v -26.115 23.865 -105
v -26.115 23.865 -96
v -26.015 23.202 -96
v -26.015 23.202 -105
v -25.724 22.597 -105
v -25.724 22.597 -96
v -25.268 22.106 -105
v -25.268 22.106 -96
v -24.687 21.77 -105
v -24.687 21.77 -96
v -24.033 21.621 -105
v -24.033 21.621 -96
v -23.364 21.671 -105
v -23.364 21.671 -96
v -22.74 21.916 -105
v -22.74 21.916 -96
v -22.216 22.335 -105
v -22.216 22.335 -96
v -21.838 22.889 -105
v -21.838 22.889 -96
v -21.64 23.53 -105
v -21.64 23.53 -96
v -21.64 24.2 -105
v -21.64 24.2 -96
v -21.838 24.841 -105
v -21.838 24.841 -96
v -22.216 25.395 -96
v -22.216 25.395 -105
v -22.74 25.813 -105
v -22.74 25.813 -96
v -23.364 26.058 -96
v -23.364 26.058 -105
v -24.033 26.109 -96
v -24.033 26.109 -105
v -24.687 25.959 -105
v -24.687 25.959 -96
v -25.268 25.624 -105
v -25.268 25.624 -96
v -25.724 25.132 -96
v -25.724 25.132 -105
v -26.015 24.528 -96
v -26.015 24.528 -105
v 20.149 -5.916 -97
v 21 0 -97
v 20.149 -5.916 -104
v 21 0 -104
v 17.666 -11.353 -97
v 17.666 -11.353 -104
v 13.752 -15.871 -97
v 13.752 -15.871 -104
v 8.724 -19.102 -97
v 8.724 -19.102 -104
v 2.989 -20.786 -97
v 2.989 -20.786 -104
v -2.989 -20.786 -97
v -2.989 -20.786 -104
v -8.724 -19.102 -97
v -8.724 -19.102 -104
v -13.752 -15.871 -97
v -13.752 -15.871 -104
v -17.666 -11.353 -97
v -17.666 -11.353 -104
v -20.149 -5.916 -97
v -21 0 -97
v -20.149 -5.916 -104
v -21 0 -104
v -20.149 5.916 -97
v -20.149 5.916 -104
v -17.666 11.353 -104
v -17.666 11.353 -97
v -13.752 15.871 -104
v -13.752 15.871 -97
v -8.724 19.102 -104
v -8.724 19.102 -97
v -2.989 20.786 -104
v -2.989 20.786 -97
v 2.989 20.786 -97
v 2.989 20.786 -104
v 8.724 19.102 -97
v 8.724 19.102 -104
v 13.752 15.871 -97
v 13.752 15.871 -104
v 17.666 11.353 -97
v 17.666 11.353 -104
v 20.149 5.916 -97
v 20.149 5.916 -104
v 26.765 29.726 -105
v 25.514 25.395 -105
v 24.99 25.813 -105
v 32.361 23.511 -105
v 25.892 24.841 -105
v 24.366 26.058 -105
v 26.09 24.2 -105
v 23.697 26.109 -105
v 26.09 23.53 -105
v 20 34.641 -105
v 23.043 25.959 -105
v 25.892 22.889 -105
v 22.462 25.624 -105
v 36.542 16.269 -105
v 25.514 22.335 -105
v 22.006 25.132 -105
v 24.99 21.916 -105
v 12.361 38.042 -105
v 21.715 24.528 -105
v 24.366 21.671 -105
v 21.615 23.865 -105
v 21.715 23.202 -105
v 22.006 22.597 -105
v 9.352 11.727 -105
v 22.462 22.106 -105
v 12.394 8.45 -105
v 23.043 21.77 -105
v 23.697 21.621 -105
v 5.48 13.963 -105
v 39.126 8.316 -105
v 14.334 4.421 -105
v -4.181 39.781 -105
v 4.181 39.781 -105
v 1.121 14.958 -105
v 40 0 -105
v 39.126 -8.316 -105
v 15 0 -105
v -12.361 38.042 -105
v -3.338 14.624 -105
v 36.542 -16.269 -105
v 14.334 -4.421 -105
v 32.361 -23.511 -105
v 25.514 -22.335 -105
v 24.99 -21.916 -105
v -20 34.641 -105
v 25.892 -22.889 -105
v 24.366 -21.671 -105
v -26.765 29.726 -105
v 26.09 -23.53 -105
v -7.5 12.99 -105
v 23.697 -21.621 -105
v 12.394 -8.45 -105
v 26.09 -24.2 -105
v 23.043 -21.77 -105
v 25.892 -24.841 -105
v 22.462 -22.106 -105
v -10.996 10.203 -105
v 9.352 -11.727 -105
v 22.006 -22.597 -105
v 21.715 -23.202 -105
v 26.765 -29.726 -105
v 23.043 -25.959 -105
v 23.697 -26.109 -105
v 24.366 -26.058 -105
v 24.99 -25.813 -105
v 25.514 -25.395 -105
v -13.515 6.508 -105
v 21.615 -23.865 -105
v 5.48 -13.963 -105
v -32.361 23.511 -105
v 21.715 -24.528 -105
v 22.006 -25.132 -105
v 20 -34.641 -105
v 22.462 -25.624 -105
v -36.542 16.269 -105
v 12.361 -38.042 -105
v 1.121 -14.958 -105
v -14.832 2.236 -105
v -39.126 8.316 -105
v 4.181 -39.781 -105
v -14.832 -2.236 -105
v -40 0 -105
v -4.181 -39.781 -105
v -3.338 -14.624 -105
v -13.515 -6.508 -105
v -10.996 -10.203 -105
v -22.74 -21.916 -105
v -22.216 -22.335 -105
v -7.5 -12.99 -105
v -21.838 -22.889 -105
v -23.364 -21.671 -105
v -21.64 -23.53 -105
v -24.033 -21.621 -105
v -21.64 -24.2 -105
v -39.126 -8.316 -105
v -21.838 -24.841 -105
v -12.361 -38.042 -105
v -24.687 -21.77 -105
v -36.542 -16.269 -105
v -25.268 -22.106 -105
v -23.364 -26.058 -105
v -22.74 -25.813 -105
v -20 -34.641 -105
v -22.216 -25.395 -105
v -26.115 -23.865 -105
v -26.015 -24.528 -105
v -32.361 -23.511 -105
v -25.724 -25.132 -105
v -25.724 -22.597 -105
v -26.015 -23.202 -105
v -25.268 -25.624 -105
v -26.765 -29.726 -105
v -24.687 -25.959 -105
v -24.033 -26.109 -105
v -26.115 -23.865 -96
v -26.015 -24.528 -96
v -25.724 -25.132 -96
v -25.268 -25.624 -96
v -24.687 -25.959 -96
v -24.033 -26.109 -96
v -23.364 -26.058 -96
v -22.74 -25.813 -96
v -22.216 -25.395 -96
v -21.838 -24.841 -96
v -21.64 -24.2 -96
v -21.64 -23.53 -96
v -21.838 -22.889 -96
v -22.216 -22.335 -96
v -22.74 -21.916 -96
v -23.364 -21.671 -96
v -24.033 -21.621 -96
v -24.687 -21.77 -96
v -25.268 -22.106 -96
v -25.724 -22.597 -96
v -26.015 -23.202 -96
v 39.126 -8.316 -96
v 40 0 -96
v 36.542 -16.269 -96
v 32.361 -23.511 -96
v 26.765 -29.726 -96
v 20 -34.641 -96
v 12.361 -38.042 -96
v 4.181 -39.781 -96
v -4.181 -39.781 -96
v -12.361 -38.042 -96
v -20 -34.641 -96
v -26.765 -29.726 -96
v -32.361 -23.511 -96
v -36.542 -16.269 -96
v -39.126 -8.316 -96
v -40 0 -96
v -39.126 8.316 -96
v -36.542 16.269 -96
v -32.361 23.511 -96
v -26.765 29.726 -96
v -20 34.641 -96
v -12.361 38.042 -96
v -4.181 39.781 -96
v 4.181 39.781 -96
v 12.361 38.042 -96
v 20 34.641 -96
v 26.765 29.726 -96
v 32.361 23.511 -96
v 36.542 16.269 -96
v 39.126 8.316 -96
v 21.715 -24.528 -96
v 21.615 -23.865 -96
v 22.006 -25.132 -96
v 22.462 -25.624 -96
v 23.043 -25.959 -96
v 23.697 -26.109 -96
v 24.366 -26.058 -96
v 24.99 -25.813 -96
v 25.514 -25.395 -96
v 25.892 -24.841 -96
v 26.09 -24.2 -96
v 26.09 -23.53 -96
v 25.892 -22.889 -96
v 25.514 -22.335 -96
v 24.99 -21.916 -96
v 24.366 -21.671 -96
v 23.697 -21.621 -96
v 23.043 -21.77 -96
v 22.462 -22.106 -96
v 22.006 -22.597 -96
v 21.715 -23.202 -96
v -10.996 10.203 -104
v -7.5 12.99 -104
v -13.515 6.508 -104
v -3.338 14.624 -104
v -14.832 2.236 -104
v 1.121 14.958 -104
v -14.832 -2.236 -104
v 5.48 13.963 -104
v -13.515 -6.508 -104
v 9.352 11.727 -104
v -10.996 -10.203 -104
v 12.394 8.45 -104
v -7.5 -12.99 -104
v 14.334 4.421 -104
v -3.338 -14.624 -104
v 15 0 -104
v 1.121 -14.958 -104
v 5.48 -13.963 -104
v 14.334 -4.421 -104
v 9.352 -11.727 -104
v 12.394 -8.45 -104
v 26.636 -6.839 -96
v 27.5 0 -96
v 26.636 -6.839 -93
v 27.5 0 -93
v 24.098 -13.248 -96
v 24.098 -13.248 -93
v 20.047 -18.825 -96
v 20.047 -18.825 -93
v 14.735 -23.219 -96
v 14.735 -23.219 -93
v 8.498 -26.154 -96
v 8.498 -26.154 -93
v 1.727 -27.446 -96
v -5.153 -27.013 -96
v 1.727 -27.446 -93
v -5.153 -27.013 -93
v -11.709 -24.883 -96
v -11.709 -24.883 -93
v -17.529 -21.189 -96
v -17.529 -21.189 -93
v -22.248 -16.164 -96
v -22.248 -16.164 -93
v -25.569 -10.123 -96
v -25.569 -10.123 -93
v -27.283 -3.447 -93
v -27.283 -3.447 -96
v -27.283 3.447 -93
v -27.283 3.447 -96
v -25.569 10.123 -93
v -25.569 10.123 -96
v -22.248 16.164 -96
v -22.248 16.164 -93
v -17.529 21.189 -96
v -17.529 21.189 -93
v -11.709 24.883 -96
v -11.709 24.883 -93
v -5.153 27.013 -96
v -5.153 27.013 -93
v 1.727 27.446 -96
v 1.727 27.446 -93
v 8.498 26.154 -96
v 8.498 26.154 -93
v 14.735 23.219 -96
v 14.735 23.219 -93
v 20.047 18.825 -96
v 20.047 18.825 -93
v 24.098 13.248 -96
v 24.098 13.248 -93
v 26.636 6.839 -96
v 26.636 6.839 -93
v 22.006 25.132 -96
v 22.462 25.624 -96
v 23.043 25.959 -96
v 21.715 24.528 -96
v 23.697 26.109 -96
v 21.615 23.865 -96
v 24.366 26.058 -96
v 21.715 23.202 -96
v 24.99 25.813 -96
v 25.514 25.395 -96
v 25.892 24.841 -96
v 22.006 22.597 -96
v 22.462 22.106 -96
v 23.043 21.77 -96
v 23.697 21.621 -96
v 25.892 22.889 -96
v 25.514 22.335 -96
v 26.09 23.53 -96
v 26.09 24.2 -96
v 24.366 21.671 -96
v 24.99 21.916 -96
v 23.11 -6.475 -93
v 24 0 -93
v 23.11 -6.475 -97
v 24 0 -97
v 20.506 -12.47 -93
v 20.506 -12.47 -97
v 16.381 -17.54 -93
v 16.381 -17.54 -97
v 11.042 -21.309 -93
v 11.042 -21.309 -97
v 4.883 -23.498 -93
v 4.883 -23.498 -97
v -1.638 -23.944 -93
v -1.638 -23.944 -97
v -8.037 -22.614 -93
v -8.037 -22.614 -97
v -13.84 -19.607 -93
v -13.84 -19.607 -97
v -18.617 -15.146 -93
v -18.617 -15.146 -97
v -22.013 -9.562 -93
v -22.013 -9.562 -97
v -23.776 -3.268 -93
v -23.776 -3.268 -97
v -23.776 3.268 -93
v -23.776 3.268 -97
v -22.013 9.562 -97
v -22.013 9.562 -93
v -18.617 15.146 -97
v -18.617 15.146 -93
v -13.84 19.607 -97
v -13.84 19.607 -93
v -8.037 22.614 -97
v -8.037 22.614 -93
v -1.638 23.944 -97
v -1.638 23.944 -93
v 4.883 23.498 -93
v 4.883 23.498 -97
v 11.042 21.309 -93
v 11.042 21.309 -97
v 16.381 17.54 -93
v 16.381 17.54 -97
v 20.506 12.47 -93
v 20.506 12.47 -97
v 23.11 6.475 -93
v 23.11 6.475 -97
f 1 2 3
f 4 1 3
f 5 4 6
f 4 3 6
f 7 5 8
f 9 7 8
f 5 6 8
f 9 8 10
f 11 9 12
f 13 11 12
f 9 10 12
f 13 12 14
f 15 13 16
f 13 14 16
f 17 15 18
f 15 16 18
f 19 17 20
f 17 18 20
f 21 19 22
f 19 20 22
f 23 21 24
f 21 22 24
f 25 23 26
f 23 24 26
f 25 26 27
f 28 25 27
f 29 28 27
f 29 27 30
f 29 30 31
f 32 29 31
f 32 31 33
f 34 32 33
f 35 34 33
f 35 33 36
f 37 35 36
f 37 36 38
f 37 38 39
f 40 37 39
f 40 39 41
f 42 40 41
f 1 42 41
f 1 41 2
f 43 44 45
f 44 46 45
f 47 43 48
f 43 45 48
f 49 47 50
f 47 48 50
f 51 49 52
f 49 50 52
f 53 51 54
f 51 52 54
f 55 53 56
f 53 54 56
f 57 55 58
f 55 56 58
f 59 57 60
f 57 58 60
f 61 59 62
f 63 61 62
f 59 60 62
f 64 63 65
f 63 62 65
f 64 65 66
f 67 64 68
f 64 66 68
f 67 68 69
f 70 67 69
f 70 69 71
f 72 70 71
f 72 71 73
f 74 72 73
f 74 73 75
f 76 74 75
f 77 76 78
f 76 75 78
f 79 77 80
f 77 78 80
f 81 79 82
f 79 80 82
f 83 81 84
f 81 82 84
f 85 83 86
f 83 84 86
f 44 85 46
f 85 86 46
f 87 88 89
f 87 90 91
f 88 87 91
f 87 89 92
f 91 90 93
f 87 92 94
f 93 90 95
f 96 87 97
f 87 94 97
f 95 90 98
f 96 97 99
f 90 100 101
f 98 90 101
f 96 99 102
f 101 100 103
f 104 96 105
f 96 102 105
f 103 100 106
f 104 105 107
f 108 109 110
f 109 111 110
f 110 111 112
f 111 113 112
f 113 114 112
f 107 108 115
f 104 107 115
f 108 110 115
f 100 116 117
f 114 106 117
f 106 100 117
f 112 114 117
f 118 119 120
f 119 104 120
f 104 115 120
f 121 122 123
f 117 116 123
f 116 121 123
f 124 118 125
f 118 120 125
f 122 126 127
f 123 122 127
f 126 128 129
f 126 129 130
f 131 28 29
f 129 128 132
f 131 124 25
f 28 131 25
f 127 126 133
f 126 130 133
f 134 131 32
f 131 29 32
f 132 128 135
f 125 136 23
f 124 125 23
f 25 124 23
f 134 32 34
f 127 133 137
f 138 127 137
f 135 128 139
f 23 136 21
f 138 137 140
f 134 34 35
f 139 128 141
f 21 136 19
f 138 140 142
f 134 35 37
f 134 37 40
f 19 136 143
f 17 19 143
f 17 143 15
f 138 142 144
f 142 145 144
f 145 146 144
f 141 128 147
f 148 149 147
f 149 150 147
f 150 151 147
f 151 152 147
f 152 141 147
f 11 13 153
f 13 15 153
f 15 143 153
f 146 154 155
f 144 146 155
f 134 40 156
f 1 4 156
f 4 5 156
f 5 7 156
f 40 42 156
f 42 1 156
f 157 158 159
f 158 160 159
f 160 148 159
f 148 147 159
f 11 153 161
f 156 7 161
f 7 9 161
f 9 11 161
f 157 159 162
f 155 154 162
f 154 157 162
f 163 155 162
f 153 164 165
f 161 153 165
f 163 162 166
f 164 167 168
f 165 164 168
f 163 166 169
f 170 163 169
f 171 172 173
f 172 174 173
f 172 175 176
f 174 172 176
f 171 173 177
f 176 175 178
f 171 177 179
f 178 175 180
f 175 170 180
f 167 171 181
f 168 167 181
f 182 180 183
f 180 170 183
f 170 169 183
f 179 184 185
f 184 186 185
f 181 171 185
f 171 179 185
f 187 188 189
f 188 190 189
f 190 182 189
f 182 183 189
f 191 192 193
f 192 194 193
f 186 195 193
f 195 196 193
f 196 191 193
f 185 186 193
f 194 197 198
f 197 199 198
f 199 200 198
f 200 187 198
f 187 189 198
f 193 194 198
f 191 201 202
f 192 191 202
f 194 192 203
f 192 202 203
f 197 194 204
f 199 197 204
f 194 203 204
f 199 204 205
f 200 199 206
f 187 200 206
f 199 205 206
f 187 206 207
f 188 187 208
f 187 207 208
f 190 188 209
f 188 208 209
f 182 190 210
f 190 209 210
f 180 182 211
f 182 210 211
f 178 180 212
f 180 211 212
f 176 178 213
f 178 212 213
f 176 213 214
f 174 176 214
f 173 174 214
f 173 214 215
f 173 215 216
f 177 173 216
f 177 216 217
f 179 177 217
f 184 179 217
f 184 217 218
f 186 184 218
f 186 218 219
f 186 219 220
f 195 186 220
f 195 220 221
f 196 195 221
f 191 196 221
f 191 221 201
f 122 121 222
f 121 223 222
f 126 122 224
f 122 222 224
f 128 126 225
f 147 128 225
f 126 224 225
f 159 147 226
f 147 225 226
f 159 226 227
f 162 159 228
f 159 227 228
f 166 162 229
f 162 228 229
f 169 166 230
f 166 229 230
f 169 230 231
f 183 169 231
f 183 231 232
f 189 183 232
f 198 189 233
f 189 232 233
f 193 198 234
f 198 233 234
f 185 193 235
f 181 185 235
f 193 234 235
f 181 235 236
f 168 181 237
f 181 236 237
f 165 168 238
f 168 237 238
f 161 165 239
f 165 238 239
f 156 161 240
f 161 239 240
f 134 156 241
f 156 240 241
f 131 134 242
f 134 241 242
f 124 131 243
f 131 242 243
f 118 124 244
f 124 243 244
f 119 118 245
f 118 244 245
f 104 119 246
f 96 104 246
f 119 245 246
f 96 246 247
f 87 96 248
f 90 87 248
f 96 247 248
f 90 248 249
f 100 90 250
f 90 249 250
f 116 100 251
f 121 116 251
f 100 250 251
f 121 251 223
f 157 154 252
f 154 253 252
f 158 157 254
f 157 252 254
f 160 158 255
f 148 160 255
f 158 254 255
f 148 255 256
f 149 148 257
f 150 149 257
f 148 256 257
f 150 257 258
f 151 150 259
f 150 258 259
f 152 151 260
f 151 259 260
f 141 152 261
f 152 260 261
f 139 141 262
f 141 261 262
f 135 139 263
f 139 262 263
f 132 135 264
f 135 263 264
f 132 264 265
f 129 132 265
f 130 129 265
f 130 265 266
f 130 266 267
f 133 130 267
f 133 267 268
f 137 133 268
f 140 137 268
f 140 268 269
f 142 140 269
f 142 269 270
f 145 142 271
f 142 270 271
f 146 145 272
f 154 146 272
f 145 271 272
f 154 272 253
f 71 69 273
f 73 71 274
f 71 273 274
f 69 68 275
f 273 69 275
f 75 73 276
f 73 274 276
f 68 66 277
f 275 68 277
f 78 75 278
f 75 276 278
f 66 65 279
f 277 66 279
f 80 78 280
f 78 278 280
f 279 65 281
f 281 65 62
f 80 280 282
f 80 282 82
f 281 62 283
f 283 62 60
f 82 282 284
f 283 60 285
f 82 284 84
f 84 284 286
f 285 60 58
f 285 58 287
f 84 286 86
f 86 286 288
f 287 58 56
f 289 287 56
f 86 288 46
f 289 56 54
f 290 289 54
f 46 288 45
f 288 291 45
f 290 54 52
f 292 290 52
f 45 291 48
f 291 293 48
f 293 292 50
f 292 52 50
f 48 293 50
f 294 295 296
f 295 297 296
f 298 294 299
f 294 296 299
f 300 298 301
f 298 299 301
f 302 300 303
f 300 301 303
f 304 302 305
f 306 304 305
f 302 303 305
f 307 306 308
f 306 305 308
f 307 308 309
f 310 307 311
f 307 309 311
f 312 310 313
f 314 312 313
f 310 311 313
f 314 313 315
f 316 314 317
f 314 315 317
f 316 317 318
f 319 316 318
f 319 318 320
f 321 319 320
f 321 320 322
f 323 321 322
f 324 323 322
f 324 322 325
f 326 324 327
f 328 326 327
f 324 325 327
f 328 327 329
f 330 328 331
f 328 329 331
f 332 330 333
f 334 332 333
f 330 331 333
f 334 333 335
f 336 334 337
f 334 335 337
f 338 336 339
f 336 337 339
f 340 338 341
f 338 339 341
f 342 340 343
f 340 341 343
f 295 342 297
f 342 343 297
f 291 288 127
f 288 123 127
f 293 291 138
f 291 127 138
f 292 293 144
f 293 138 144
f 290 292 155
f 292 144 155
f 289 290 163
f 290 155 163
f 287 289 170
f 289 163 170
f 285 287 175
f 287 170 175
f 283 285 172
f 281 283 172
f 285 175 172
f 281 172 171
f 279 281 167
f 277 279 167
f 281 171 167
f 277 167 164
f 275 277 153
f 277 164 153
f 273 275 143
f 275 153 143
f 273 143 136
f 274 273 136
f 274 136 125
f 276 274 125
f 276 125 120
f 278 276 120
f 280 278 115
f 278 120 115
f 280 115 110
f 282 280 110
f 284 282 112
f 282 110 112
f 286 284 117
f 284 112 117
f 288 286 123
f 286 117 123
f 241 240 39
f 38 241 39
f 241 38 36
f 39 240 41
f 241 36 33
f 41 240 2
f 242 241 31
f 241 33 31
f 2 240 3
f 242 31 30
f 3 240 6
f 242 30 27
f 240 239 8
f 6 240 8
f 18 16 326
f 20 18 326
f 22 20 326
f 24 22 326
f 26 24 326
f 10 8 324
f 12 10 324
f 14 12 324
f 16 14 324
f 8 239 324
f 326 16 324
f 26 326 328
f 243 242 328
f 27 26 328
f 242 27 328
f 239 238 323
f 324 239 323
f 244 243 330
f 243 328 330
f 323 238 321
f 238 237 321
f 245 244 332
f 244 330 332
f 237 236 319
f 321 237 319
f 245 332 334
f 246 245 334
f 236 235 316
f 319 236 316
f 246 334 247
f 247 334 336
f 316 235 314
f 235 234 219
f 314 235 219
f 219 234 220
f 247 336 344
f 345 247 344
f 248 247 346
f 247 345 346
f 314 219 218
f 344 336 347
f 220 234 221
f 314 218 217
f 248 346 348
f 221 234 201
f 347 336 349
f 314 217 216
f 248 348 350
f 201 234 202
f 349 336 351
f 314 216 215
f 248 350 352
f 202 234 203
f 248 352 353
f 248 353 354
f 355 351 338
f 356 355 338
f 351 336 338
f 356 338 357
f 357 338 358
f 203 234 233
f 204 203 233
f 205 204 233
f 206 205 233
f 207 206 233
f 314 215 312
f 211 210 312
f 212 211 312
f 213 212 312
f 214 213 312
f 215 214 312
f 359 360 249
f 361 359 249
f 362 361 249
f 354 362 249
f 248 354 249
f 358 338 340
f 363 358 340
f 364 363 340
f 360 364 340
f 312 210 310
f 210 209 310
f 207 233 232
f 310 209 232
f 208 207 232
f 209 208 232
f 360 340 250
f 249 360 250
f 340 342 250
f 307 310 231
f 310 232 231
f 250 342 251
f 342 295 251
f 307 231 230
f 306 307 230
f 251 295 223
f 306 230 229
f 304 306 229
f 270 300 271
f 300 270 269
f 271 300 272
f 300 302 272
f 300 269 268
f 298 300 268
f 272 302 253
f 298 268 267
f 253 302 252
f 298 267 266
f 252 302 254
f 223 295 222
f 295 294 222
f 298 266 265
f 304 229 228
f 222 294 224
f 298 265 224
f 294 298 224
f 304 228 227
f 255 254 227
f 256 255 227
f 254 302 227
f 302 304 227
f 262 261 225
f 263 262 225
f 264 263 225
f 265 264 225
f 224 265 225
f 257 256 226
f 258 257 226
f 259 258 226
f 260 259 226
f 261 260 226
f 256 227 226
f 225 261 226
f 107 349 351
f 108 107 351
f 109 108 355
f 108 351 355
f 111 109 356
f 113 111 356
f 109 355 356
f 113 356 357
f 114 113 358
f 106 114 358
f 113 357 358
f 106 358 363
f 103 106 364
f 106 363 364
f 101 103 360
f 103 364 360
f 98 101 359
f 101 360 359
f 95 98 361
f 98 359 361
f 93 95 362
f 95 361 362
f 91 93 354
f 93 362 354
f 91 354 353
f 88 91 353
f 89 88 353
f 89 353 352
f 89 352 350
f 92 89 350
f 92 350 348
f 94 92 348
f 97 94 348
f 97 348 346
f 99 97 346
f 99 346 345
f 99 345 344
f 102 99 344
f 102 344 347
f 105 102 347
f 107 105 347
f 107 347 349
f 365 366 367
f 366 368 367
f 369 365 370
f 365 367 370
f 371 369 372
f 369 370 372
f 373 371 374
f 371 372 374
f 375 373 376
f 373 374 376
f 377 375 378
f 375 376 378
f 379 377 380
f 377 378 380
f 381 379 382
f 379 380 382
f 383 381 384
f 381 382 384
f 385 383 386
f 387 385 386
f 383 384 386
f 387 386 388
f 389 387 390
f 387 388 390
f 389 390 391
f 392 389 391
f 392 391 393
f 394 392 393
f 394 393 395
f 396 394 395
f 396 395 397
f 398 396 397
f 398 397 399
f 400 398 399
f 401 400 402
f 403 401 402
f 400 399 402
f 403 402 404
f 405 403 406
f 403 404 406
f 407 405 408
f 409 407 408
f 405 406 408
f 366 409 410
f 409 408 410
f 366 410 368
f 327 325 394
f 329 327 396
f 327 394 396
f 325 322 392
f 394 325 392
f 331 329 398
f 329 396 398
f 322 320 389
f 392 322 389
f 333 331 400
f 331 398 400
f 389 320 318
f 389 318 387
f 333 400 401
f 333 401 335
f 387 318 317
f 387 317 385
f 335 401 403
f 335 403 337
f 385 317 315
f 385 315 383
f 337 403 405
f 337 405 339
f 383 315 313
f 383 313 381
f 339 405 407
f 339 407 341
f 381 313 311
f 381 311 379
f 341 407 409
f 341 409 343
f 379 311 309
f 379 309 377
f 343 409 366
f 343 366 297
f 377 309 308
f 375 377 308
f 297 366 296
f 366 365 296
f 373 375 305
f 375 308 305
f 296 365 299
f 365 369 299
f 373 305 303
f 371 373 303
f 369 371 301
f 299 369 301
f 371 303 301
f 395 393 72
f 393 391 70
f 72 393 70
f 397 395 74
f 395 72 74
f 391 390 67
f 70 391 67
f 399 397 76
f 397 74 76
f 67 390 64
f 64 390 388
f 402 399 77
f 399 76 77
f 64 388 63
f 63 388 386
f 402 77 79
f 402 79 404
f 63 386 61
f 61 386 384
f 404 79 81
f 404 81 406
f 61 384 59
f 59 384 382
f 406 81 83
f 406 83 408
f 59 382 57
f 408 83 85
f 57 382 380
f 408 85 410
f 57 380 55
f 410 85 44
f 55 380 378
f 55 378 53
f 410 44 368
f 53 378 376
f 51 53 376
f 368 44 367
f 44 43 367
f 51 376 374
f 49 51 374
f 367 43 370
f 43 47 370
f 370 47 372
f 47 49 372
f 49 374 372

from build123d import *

# Parameters (mm, degrees)
SKETCH4_R                = 2.25
CUT_4XD4_5_PCD67_5_DEPTH = 150


with BuildPart() as part:
    # Sketch3 → REV_Seal_Cover_28x42x7 (revolve)
    with BuildSketch(Plane(origin=(0, 0, 0), x_dir=(1, 0, 0), z_dir=(0, 1, 0))):
        Polygon((15, 105), (40, 105), (40, 96), (27.5, 96), (27.5, 93), (24, 93), (24, 97), (21, 97), (21, 104), (15, 104), align=None)
    revolve(axis=Axis((0, 0, 150), (0, 0, -1)))

    # Sketch4 → CUT_4xD4.5_PCD67.5 (cut, symmetric)
    with BuildSketch(Plane.XY):
        with Locations(Location((23.8649, 23.8649, 0), (0, 0, 180))):
            Circle(SKETCH4_R)
        with Locations(Location((-23.8649, 23.8649, 0), (0, 0, 180))):
            Circle(SKETCH4_R)
        with Locations(Location((-23.8649, -23.8649, 0), (0, 0, 180))):
            Circle(SKETCH4_R)
        with Locations(Location((23.8649, -23.8649, 0), (0, 0, 180))):
            Circle(SKETCH4_R)
    extrude(amount=CUT_4XD4_5_PCD67_5_DEPTH, both=True, mode=Mode.SUBTRACT)


solid = part.part
